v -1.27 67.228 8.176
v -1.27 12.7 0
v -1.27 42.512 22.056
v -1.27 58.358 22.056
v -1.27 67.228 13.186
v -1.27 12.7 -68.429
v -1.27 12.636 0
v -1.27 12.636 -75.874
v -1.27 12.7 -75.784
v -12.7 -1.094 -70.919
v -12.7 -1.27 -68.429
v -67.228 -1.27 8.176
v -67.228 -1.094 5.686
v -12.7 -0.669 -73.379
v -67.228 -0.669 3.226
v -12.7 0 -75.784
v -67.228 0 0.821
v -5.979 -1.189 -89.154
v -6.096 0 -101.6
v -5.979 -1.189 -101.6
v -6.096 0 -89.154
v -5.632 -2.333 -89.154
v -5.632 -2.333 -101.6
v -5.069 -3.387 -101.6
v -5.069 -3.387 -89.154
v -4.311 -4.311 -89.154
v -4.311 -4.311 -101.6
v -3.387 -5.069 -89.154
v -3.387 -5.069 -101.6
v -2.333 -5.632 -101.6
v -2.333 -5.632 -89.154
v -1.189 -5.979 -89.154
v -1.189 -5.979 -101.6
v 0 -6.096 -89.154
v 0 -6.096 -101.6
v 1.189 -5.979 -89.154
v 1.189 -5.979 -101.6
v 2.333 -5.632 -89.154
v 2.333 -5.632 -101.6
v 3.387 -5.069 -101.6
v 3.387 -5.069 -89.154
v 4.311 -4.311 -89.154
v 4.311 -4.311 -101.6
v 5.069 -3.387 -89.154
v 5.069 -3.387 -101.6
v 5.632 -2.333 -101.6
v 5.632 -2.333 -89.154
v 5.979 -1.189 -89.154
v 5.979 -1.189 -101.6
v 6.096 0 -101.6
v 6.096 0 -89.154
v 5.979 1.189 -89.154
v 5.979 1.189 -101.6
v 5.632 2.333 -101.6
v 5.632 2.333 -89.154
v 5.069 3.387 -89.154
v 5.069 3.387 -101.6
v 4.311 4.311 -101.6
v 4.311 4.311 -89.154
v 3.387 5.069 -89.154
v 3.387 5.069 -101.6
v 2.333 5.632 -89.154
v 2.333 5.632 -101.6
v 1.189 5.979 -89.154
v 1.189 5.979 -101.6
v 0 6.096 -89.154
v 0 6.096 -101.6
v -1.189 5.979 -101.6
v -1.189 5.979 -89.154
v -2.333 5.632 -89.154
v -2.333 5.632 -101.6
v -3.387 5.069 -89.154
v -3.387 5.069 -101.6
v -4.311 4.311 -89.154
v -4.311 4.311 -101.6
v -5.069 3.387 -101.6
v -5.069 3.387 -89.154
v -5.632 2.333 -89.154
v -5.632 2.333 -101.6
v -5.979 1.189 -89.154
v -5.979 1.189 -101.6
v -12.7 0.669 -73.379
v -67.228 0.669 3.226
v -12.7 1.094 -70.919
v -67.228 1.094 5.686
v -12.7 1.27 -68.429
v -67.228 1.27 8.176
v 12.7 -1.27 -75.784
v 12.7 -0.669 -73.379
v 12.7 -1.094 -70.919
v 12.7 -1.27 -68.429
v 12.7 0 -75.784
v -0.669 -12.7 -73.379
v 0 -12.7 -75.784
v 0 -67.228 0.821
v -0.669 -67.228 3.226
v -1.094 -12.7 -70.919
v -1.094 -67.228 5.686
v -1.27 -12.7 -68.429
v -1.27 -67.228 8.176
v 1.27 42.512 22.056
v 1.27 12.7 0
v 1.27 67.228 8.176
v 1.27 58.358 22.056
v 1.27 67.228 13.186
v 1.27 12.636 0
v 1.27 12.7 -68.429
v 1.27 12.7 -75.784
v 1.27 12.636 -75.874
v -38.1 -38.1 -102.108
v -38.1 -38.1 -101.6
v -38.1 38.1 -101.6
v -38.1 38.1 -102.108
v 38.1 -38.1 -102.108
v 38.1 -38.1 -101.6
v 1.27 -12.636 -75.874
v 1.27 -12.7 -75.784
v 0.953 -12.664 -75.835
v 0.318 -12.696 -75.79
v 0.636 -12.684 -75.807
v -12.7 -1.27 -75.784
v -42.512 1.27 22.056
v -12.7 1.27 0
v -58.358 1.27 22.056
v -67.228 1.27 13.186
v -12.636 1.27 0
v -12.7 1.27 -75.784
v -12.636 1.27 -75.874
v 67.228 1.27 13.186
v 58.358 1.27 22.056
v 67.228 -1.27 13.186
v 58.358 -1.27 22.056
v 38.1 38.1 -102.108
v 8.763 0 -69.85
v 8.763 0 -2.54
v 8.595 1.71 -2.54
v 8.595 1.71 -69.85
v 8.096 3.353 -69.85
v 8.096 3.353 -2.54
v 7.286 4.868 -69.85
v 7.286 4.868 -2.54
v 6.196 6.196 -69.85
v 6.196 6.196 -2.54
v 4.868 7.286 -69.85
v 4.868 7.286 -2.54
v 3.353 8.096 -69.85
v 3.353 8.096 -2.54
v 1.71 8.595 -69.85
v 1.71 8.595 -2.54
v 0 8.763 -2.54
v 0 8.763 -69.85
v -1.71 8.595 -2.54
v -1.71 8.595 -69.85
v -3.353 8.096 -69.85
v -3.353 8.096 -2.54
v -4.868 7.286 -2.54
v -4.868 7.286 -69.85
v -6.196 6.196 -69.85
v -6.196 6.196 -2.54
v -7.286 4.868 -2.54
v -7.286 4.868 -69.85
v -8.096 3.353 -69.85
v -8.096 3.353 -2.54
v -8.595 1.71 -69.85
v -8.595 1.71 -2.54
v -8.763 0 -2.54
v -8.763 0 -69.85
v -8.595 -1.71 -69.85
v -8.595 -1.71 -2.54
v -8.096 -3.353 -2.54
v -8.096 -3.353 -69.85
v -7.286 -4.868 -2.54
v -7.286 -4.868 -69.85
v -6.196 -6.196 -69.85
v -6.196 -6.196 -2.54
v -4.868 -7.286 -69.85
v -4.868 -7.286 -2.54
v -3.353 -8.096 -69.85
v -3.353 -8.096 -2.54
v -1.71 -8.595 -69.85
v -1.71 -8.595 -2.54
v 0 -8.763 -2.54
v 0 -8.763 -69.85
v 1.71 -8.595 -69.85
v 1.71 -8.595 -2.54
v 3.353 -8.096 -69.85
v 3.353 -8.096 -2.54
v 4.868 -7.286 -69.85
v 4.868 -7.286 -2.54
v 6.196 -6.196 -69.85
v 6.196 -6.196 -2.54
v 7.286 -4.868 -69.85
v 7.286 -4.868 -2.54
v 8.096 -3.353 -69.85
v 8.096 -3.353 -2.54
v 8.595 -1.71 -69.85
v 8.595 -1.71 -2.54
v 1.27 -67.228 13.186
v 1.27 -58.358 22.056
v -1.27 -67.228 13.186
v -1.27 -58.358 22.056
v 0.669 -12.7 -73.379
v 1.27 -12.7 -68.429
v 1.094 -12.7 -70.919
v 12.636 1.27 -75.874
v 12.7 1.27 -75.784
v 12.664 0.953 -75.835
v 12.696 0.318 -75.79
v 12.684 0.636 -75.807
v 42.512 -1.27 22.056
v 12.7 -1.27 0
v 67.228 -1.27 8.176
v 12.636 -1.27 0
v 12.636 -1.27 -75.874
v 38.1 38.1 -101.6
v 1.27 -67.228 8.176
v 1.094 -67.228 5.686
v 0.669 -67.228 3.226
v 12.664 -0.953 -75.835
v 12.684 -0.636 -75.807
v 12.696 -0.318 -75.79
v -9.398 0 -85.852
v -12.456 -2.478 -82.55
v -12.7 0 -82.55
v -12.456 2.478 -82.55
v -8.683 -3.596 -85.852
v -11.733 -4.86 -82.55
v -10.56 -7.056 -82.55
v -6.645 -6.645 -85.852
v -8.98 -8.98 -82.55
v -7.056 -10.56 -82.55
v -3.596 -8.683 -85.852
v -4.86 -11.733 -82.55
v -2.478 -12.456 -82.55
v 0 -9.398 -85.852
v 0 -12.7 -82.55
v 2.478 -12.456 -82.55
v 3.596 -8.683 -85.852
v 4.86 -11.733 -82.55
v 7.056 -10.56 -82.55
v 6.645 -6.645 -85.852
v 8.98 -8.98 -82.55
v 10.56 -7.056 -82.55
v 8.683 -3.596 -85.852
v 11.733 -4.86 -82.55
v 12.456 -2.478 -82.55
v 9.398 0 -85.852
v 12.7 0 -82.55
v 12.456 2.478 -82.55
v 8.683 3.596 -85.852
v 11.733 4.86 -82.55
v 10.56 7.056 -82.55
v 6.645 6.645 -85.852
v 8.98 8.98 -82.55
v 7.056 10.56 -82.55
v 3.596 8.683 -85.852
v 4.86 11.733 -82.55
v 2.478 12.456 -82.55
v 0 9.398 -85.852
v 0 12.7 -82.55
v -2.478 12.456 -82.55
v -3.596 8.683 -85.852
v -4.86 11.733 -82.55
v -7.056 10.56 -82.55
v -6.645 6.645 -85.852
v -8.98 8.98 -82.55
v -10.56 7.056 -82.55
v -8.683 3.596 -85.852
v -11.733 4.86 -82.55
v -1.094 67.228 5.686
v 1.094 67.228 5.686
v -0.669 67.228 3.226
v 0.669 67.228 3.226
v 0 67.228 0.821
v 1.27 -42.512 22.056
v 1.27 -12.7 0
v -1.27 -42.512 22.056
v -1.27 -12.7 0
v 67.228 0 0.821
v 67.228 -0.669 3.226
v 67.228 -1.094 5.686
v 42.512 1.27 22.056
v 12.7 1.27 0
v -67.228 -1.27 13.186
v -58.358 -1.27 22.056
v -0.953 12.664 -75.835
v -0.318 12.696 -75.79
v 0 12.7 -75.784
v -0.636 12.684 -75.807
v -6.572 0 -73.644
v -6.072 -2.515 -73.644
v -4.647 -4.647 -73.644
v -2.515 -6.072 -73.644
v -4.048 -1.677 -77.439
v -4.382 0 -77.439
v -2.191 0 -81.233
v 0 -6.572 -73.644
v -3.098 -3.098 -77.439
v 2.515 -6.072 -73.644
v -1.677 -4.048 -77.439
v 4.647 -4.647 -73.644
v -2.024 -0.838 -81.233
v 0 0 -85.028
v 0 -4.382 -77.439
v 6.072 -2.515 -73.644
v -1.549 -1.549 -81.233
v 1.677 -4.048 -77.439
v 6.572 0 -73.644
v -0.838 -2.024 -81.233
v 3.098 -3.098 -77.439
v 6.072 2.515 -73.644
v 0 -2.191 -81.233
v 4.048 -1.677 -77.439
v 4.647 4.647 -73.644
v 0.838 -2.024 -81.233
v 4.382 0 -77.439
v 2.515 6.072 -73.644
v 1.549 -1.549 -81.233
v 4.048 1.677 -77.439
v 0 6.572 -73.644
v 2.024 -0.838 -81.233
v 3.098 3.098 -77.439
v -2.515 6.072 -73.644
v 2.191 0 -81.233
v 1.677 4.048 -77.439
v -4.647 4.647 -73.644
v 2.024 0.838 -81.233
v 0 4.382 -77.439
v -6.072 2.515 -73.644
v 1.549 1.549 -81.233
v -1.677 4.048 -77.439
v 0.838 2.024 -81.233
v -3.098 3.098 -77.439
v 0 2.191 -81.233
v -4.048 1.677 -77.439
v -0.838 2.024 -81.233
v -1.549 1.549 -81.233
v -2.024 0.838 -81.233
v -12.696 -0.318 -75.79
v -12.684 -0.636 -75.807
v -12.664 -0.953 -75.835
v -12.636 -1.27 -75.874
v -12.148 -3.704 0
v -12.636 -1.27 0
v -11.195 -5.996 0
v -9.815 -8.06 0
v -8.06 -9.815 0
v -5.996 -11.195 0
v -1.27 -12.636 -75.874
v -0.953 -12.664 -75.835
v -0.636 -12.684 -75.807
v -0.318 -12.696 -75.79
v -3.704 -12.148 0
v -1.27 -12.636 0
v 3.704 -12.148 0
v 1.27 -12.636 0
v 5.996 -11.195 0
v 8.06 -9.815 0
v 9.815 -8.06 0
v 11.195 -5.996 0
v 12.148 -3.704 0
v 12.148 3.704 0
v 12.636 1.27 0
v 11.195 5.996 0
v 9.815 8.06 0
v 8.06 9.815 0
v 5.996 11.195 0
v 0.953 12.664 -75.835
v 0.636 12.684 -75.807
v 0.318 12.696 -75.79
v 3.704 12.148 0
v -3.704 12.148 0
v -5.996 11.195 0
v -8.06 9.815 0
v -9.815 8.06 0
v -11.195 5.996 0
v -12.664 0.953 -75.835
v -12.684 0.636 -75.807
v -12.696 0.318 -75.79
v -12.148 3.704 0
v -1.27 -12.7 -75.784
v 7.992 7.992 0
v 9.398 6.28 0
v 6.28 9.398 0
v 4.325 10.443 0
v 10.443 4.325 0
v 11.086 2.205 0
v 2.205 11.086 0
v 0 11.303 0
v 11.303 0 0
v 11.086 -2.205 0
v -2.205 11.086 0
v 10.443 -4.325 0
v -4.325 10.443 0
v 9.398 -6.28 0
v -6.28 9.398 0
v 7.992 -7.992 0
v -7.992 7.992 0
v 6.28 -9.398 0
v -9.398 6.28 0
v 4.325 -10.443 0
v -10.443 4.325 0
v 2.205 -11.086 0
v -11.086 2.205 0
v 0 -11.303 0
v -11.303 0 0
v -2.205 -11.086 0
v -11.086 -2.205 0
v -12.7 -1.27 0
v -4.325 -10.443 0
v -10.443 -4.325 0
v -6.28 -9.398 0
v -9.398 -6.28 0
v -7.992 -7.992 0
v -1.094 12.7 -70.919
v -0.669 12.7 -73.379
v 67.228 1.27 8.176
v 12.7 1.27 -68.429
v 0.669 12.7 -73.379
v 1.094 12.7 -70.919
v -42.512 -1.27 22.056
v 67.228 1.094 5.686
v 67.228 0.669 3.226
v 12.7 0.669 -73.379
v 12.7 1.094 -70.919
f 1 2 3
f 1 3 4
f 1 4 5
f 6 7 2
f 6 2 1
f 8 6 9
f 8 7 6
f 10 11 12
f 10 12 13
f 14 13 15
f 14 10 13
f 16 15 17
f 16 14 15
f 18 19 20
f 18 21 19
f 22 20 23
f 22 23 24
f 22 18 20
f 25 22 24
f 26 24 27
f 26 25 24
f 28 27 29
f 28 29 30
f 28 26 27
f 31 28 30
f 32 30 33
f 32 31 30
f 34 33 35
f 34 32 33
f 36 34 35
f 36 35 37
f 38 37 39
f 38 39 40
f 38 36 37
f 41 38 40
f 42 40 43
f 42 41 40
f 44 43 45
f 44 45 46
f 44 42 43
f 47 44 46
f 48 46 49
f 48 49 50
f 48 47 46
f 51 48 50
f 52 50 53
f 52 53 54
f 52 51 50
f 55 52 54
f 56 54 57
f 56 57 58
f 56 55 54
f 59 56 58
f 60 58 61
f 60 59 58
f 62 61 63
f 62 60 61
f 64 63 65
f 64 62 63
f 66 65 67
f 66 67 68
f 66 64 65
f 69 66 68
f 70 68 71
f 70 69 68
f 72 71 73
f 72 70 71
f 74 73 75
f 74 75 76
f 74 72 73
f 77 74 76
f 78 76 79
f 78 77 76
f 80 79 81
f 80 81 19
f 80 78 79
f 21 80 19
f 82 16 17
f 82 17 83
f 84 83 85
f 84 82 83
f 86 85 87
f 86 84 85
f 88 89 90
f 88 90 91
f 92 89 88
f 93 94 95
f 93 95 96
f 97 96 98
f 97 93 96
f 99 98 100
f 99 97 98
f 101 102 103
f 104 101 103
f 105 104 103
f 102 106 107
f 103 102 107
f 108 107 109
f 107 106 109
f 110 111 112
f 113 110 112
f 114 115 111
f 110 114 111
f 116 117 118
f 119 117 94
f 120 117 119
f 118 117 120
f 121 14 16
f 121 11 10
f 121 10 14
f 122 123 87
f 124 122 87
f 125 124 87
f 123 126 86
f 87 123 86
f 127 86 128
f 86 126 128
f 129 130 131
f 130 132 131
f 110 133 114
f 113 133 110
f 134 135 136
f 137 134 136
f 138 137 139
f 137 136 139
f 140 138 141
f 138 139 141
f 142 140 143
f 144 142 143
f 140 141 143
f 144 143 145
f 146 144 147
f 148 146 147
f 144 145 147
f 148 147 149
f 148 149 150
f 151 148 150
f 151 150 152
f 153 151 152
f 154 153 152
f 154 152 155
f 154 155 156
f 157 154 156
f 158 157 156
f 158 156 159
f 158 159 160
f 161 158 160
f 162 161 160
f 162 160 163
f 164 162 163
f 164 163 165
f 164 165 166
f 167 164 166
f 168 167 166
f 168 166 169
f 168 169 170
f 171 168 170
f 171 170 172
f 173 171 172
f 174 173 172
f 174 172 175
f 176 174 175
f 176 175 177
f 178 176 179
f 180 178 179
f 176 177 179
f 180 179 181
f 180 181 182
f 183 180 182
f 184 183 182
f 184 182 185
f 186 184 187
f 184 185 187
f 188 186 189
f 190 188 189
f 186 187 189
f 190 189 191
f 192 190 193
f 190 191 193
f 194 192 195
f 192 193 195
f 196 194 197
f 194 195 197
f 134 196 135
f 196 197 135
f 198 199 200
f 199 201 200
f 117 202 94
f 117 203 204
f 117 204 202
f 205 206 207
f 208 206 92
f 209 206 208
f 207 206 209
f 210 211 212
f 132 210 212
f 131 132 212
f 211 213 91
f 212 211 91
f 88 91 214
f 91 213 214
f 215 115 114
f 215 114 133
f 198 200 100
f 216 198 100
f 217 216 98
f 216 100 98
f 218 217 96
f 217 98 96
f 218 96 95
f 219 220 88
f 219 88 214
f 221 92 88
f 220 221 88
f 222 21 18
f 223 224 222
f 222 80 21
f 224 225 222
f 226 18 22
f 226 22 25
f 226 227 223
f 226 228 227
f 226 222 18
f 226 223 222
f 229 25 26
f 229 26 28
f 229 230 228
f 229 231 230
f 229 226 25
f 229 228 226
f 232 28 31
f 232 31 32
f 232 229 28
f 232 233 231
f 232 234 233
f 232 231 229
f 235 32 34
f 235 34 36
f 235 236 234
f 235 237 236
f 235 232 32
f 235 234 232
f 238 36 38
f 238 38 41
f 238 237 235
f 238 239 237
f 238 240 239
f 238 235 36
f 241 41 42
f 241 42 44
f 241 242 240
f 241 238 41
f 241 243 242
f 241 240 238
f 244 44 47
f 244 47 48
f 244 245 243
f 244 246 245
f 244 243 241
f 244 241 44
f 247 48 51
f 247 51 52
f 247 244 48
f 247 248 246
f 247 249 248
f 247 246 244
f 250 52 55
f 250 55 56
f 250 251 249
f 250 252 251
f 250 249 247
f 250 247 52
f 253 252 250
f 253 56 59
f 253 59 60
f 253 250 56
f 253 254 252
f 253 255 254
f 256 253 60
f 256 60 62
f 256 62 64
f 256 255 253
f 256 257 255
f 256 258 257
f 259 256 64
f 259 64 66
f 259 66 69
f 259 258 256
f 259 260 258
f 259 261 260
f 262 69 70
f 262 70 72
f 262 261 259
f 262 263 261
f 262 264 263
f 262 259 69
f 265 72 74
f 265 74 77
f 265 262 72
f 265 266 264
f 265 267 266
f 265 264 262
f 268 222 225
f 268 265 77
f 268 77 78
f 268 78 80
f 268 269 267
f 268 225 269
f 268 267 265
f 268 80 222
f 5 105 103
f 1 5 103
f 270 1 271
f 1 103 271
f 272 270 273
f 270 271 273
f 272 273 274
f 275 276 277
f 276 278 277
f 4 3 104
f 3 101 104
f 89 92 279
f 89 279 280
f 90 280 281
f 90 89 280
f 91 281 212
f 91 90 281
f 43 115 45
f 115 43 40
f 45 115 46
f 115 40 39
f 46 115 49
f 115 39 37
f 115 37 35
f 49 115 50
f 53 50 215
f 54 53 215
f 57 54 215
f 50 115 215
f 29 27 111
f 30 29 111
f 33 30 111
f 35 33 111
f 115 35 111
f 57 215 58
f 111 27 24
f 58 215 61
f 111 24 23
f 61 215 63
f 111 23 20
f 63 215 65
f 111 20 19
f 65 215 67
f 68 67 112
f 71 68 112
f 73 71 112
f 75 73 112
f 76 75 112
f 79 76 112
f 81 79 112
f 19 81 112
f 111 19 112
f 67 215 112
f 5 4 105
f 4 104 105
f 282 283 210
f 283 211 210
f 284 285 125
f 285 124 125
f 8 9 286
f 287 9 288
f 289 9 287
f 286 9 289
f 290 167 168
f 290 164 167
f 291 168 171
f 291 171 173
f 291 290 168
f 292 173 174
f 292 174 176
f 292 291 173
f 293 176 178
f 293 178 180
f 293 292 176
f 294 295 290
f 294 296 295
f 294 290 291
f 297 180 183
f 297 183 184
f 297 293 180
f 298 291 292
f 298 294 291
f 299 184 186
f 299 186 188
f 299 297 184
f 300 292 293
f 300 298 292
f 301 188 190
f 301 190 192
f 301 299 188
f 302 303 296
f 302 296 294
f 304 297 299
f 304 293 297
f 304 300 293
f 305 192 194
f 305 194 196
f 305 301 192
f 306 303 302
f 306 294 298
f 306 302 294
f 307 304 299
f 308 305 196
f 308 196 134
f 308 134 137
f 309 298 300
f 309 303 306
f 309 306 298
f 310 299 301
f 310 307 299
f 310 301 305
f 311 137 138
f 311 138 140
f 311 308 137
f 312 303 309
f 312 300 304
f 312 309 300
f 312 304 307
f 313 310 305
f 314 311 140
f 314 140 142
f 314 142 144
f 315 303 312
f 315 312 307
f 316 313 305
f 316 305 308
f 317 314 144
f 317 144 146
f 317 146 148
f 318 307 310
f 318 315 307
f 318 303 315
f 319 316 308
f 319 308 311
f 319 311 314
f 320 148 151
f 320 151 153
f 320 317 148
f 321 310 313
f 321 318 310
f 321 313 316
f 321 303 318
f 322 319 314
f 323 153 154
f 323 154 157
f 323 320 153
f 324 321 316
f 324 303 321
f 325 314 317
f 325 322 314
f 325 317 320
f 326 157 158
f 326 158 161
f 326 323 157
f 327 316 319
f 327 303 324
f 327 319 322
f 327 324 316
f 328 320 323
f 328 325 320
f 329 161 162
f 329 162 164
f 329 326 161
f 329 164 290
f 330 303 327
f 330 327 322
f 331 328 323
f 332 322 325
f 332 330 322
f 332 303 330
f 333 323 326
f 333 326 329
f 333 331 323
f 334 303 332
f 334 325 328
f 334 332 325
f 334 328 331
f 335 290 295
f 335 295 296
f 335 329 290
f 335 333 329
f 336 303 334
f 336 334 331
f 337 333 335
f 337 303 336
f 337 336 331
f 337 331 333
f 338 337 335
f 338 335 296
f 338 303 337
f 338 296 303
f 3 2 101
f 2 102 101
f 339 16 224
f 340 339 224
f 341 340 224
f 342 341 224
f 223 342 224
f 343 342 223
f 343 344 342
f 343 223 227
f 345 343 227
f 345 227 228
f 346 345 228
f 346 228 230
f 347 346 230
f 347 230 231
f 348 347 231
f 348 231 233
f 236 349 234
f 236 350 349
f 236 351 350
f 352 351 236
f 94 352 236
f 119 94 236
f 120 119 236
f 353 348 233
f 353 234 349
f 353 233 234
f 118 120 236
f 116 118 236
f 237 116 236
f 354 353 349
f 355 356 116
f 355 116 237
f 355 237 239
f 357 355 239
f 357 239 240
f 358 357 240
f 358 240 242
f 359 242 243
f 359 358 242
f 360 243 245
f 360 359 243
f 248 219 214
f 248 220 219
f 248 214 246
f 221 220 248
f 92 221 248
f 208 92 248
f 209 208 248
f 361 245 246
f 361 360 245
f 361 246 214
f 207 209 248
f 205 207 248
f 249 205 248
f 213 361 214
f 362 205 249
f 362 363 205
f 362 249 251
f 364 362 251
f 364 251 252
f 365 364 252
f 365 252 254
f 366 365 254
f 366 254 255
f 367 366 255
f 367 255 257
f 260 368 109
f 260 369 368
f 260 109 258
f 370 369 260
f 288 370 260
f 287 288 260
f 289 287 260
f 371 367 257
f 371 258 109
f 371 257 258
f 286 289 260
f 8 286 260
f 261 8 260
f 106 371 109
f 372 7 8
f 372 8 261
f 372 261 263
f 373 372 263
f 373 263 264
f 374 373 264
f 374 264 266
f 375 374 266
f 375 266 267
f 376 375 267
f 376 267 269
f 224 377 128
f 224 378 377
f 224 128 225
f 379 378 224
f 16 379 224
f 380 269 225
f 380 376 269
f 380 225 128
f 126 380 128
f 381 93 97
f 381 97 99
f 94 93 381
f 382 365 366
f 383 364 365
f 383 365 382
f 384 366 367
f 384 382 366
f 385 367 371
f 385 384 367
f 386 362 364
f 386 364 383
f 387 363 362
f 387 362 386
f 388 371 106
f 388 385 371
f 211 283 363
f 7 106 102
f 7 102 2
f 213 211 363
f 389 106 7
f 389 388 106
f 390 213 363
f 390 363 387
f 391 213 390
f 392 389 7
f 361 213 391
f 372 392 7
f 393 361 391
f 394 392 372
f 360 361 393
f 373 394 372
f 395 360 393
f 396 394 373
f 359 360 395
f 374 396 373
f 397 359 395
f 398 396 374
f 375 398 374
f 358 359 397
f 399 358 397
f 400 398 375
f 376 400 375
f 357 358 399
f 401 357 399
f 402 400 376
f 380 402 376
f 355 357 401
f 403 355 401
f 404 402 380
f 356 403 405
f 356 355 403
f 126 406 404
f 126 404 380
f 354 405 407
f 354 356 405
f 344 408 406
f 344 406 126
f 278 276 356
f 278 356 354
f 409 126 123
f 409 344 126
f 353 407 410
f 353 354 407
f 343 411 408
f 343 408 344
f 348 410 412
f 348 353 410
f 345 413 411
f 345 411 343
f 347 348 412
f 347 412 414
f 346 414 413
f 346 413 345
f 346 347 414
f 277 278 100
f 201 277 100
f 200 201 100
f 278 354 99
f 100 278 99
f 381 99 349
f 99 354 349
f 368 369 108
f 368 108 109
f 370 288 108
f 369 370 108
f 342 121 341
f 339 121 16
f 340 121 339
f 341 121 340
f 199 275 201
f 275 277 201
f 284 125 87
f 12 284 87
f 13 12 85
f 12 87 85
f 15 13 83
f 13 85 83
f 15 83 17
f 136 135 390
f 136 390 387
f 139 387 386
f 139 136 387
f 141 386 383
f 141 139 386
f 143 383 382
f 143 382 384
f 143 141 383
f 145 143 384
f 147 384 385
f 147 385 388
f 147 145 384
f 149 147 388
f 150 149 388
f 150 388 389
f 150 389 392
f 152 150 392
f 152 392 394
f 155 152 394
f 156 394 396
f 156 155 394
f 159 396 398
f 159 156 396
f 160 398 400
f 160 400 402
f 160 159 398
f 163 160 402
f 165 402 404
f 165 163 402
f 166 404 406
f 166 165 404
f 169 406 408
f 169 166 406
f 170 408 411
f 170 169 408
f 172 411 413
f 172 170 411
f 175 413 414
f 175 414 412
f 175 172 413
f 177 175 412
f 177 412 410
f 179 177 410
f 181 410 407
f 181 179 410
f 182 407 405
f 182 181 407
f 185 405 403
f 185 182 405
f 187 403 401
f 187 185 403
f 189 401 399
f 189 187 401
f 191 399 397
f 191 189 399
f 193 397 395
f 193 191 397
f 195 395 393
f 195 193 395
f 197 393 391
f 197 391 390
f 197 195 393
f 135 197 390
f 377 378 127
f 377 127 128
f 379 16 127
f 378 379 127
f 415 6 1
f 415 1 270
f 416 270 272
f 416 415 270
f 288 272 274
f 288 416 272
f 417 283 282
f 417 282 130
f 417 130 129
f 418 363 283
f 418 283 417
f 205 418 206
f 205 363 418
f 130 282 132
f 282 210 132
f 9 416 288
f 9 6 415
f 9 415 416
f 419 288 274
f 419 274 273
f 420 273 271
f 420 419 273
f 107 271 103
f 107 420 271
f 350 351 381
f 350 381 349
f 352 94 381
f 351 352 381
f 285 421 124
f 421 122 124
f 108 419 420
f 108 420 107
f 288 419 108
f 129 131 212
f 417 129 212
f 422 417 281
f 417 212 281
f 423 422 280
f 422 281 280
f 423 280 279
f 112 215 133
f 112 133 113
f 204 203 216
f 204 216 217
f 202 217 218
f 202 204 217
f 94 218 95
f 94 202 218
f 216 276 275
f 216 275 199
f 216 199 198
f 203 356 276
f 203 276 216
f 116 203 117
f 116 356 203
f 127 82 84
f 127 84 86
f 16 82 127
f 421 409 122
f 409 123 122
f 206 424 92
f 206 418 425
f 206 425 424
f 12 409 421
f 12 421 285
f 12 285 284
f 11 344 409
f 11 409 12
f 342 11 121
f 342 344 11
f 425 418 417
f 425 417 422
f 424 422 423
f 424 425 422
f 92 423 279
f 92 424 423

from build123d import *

# Parameters (mm, degrees)
SKETCH2_R           = 8.763
CUT_EXTRUDE1_DEPTH  = 69.85
BOSS_EXTRUDE1_DEPTH = 1.27
CIRPATTERN1_COUNT   = 4
CHAMFER1_SIZE       = 2.54
SKETCH10_W          = 76.2
SKETCH10_H          = 76.2
BOSS_EXTRUDE4_DEPTH = 0.508


with BuildPart() as part:
    # Sketch1 → Revolve1 (revolve)
    with BuildSketch(Plane(origin=(0, 0, 0), x_dir=(1, 0, 0), z_dir=(0, 1, 0))):
        Polygon((0, 101.6), (-6.096, 101.6), (-6.096, 89.154), (-12.7, 82.55), (-12.7, 0), (0, 0), align=None)
    revolve(axis=Axis((0, 0, -101.6), (0, 0, 1)))

    # Sketch2 → Cut-Extrude1 (cut)
    with BuildSketch(Plane.XY):
        Circle(SKETCH2_R)
    extrude(amount=-CUT_EXTRUDE1_DEPTH, mode=Mode.SUBTRACT)

    # Sketch3 → Boss-Extrude1 (add, symmetric)
    with BuildSketch(Plane(origin=(0, 0, 0), x_dir=(1, 0, 0), z_dir=(0, 1, 0))):
        Polygon((-10.365704675, 0), (-12.7, 0), (-42.511621146, -22.056416192), (-58.358338046, -22.056416192), (-67.228379248, -13.18637499), (-67.228379248, -0.821064085), (-10.365704675, 79.063680635), align=None)
    boss_extrude1 = extrude(amount=BOSS_EXTRUDE1_DEPTH, both=True)

    # Cut-Sweep1: sweep along a path in Sketch4
    with BuildLine(Plane(origin=(-44.232547401, 0, -31.485122188), x_dir=(-0.579901297, 0, 0.814686741), z_dir=(-0.814686741, 0, -0.579901297))) as cut_sweep1_path:
        Line((39.654734318, 0), (-54.375714603, 0))
    # Sketch5 → Cut-Sweep1 (sweep, cut)
    with BuildSketch(Plane.ZY.offset(67.228379248)):
        with BuildLine():
            Line((8.176199828, -4.186863215), (8.176199828, -1.27))
            ThreePointArc((8.176199828, -1.27), (4.450761752, -0.912237677), (0.821064085, 0))
            ThreePointArc((0.821064085, 0), (4.450761752, 0.912237677), (8.176199828, 1.27))
            Line((8.176199828, 1.27), (8.176199828, 4.131781822))
            Line((8.176199828, 4.131781822), (-5.582166947, 4.131781822))
            Line((-5.582166947, 4.131781822), (-5.582166947, -4.186863215))
            Line((-5.582166947, -4.186863215), (8.176199828, -4.186863215))
        make_face()
    cut_sweep1 = sweep(path=cut_sweep1_path.line, mode=Mode.SUBTRACT)

    # CirPattern1: Boss-Extrude1, Cut-Sweep1 ×4 about axis
    cirpattern1_axis = Axis((0, 0, 38.786024747), (0, 0, -1))
    add([boss_extrude1.rotate(cirpattern1_axis, i * 360 / CIRPATTERN1_COUNT) for i in range(1, CIRPATTERN1_COUNT)])
    add([cut_sweep1.rotate(cirpattern1_axis, i * 360 / CIRPATTERN1_COUNT) for i in range(1, CIRPATTERN1_COUNT)], mode=Mode.SUBTRACT)

    # Sketch6 → Cut-Revolve1 (revolve, cut)
    with BuildSketch(Plane(origin=(0, 0, 0), x_dir=(1, 0, 0), z_dir=(0, 1, 0))):
        Polygon((-8.763, 69.85), (0, 85.027961227), (0, 69.85), align=None)
    revolve(axis=Axis((0, 0, -85.027961227), (0, 0, 1)), mode=Mode.SUBTRACT)

    # Chamfer1
    chamfer1_edges = [part.edges().sort_by_distance(p)[0] for p in [
        (-8.763, 0, 0),
    ]]
    chamfer(chamfer1_edges, length=CHAMFER1_SIZE)

    # Sketch10 → Boss-Extrude4 (add)
    with BuildSketch(Plane(origin=(0, 0, -101.6), x_dir=(-1, 0, 0), z_dir=(0, 0, -1))):
        Rectangle(SKETCH10_W, SKETCH10_H)
    extrude(amount=BOSS_EXTRUDE4_DEPTH)


solid = part.part
